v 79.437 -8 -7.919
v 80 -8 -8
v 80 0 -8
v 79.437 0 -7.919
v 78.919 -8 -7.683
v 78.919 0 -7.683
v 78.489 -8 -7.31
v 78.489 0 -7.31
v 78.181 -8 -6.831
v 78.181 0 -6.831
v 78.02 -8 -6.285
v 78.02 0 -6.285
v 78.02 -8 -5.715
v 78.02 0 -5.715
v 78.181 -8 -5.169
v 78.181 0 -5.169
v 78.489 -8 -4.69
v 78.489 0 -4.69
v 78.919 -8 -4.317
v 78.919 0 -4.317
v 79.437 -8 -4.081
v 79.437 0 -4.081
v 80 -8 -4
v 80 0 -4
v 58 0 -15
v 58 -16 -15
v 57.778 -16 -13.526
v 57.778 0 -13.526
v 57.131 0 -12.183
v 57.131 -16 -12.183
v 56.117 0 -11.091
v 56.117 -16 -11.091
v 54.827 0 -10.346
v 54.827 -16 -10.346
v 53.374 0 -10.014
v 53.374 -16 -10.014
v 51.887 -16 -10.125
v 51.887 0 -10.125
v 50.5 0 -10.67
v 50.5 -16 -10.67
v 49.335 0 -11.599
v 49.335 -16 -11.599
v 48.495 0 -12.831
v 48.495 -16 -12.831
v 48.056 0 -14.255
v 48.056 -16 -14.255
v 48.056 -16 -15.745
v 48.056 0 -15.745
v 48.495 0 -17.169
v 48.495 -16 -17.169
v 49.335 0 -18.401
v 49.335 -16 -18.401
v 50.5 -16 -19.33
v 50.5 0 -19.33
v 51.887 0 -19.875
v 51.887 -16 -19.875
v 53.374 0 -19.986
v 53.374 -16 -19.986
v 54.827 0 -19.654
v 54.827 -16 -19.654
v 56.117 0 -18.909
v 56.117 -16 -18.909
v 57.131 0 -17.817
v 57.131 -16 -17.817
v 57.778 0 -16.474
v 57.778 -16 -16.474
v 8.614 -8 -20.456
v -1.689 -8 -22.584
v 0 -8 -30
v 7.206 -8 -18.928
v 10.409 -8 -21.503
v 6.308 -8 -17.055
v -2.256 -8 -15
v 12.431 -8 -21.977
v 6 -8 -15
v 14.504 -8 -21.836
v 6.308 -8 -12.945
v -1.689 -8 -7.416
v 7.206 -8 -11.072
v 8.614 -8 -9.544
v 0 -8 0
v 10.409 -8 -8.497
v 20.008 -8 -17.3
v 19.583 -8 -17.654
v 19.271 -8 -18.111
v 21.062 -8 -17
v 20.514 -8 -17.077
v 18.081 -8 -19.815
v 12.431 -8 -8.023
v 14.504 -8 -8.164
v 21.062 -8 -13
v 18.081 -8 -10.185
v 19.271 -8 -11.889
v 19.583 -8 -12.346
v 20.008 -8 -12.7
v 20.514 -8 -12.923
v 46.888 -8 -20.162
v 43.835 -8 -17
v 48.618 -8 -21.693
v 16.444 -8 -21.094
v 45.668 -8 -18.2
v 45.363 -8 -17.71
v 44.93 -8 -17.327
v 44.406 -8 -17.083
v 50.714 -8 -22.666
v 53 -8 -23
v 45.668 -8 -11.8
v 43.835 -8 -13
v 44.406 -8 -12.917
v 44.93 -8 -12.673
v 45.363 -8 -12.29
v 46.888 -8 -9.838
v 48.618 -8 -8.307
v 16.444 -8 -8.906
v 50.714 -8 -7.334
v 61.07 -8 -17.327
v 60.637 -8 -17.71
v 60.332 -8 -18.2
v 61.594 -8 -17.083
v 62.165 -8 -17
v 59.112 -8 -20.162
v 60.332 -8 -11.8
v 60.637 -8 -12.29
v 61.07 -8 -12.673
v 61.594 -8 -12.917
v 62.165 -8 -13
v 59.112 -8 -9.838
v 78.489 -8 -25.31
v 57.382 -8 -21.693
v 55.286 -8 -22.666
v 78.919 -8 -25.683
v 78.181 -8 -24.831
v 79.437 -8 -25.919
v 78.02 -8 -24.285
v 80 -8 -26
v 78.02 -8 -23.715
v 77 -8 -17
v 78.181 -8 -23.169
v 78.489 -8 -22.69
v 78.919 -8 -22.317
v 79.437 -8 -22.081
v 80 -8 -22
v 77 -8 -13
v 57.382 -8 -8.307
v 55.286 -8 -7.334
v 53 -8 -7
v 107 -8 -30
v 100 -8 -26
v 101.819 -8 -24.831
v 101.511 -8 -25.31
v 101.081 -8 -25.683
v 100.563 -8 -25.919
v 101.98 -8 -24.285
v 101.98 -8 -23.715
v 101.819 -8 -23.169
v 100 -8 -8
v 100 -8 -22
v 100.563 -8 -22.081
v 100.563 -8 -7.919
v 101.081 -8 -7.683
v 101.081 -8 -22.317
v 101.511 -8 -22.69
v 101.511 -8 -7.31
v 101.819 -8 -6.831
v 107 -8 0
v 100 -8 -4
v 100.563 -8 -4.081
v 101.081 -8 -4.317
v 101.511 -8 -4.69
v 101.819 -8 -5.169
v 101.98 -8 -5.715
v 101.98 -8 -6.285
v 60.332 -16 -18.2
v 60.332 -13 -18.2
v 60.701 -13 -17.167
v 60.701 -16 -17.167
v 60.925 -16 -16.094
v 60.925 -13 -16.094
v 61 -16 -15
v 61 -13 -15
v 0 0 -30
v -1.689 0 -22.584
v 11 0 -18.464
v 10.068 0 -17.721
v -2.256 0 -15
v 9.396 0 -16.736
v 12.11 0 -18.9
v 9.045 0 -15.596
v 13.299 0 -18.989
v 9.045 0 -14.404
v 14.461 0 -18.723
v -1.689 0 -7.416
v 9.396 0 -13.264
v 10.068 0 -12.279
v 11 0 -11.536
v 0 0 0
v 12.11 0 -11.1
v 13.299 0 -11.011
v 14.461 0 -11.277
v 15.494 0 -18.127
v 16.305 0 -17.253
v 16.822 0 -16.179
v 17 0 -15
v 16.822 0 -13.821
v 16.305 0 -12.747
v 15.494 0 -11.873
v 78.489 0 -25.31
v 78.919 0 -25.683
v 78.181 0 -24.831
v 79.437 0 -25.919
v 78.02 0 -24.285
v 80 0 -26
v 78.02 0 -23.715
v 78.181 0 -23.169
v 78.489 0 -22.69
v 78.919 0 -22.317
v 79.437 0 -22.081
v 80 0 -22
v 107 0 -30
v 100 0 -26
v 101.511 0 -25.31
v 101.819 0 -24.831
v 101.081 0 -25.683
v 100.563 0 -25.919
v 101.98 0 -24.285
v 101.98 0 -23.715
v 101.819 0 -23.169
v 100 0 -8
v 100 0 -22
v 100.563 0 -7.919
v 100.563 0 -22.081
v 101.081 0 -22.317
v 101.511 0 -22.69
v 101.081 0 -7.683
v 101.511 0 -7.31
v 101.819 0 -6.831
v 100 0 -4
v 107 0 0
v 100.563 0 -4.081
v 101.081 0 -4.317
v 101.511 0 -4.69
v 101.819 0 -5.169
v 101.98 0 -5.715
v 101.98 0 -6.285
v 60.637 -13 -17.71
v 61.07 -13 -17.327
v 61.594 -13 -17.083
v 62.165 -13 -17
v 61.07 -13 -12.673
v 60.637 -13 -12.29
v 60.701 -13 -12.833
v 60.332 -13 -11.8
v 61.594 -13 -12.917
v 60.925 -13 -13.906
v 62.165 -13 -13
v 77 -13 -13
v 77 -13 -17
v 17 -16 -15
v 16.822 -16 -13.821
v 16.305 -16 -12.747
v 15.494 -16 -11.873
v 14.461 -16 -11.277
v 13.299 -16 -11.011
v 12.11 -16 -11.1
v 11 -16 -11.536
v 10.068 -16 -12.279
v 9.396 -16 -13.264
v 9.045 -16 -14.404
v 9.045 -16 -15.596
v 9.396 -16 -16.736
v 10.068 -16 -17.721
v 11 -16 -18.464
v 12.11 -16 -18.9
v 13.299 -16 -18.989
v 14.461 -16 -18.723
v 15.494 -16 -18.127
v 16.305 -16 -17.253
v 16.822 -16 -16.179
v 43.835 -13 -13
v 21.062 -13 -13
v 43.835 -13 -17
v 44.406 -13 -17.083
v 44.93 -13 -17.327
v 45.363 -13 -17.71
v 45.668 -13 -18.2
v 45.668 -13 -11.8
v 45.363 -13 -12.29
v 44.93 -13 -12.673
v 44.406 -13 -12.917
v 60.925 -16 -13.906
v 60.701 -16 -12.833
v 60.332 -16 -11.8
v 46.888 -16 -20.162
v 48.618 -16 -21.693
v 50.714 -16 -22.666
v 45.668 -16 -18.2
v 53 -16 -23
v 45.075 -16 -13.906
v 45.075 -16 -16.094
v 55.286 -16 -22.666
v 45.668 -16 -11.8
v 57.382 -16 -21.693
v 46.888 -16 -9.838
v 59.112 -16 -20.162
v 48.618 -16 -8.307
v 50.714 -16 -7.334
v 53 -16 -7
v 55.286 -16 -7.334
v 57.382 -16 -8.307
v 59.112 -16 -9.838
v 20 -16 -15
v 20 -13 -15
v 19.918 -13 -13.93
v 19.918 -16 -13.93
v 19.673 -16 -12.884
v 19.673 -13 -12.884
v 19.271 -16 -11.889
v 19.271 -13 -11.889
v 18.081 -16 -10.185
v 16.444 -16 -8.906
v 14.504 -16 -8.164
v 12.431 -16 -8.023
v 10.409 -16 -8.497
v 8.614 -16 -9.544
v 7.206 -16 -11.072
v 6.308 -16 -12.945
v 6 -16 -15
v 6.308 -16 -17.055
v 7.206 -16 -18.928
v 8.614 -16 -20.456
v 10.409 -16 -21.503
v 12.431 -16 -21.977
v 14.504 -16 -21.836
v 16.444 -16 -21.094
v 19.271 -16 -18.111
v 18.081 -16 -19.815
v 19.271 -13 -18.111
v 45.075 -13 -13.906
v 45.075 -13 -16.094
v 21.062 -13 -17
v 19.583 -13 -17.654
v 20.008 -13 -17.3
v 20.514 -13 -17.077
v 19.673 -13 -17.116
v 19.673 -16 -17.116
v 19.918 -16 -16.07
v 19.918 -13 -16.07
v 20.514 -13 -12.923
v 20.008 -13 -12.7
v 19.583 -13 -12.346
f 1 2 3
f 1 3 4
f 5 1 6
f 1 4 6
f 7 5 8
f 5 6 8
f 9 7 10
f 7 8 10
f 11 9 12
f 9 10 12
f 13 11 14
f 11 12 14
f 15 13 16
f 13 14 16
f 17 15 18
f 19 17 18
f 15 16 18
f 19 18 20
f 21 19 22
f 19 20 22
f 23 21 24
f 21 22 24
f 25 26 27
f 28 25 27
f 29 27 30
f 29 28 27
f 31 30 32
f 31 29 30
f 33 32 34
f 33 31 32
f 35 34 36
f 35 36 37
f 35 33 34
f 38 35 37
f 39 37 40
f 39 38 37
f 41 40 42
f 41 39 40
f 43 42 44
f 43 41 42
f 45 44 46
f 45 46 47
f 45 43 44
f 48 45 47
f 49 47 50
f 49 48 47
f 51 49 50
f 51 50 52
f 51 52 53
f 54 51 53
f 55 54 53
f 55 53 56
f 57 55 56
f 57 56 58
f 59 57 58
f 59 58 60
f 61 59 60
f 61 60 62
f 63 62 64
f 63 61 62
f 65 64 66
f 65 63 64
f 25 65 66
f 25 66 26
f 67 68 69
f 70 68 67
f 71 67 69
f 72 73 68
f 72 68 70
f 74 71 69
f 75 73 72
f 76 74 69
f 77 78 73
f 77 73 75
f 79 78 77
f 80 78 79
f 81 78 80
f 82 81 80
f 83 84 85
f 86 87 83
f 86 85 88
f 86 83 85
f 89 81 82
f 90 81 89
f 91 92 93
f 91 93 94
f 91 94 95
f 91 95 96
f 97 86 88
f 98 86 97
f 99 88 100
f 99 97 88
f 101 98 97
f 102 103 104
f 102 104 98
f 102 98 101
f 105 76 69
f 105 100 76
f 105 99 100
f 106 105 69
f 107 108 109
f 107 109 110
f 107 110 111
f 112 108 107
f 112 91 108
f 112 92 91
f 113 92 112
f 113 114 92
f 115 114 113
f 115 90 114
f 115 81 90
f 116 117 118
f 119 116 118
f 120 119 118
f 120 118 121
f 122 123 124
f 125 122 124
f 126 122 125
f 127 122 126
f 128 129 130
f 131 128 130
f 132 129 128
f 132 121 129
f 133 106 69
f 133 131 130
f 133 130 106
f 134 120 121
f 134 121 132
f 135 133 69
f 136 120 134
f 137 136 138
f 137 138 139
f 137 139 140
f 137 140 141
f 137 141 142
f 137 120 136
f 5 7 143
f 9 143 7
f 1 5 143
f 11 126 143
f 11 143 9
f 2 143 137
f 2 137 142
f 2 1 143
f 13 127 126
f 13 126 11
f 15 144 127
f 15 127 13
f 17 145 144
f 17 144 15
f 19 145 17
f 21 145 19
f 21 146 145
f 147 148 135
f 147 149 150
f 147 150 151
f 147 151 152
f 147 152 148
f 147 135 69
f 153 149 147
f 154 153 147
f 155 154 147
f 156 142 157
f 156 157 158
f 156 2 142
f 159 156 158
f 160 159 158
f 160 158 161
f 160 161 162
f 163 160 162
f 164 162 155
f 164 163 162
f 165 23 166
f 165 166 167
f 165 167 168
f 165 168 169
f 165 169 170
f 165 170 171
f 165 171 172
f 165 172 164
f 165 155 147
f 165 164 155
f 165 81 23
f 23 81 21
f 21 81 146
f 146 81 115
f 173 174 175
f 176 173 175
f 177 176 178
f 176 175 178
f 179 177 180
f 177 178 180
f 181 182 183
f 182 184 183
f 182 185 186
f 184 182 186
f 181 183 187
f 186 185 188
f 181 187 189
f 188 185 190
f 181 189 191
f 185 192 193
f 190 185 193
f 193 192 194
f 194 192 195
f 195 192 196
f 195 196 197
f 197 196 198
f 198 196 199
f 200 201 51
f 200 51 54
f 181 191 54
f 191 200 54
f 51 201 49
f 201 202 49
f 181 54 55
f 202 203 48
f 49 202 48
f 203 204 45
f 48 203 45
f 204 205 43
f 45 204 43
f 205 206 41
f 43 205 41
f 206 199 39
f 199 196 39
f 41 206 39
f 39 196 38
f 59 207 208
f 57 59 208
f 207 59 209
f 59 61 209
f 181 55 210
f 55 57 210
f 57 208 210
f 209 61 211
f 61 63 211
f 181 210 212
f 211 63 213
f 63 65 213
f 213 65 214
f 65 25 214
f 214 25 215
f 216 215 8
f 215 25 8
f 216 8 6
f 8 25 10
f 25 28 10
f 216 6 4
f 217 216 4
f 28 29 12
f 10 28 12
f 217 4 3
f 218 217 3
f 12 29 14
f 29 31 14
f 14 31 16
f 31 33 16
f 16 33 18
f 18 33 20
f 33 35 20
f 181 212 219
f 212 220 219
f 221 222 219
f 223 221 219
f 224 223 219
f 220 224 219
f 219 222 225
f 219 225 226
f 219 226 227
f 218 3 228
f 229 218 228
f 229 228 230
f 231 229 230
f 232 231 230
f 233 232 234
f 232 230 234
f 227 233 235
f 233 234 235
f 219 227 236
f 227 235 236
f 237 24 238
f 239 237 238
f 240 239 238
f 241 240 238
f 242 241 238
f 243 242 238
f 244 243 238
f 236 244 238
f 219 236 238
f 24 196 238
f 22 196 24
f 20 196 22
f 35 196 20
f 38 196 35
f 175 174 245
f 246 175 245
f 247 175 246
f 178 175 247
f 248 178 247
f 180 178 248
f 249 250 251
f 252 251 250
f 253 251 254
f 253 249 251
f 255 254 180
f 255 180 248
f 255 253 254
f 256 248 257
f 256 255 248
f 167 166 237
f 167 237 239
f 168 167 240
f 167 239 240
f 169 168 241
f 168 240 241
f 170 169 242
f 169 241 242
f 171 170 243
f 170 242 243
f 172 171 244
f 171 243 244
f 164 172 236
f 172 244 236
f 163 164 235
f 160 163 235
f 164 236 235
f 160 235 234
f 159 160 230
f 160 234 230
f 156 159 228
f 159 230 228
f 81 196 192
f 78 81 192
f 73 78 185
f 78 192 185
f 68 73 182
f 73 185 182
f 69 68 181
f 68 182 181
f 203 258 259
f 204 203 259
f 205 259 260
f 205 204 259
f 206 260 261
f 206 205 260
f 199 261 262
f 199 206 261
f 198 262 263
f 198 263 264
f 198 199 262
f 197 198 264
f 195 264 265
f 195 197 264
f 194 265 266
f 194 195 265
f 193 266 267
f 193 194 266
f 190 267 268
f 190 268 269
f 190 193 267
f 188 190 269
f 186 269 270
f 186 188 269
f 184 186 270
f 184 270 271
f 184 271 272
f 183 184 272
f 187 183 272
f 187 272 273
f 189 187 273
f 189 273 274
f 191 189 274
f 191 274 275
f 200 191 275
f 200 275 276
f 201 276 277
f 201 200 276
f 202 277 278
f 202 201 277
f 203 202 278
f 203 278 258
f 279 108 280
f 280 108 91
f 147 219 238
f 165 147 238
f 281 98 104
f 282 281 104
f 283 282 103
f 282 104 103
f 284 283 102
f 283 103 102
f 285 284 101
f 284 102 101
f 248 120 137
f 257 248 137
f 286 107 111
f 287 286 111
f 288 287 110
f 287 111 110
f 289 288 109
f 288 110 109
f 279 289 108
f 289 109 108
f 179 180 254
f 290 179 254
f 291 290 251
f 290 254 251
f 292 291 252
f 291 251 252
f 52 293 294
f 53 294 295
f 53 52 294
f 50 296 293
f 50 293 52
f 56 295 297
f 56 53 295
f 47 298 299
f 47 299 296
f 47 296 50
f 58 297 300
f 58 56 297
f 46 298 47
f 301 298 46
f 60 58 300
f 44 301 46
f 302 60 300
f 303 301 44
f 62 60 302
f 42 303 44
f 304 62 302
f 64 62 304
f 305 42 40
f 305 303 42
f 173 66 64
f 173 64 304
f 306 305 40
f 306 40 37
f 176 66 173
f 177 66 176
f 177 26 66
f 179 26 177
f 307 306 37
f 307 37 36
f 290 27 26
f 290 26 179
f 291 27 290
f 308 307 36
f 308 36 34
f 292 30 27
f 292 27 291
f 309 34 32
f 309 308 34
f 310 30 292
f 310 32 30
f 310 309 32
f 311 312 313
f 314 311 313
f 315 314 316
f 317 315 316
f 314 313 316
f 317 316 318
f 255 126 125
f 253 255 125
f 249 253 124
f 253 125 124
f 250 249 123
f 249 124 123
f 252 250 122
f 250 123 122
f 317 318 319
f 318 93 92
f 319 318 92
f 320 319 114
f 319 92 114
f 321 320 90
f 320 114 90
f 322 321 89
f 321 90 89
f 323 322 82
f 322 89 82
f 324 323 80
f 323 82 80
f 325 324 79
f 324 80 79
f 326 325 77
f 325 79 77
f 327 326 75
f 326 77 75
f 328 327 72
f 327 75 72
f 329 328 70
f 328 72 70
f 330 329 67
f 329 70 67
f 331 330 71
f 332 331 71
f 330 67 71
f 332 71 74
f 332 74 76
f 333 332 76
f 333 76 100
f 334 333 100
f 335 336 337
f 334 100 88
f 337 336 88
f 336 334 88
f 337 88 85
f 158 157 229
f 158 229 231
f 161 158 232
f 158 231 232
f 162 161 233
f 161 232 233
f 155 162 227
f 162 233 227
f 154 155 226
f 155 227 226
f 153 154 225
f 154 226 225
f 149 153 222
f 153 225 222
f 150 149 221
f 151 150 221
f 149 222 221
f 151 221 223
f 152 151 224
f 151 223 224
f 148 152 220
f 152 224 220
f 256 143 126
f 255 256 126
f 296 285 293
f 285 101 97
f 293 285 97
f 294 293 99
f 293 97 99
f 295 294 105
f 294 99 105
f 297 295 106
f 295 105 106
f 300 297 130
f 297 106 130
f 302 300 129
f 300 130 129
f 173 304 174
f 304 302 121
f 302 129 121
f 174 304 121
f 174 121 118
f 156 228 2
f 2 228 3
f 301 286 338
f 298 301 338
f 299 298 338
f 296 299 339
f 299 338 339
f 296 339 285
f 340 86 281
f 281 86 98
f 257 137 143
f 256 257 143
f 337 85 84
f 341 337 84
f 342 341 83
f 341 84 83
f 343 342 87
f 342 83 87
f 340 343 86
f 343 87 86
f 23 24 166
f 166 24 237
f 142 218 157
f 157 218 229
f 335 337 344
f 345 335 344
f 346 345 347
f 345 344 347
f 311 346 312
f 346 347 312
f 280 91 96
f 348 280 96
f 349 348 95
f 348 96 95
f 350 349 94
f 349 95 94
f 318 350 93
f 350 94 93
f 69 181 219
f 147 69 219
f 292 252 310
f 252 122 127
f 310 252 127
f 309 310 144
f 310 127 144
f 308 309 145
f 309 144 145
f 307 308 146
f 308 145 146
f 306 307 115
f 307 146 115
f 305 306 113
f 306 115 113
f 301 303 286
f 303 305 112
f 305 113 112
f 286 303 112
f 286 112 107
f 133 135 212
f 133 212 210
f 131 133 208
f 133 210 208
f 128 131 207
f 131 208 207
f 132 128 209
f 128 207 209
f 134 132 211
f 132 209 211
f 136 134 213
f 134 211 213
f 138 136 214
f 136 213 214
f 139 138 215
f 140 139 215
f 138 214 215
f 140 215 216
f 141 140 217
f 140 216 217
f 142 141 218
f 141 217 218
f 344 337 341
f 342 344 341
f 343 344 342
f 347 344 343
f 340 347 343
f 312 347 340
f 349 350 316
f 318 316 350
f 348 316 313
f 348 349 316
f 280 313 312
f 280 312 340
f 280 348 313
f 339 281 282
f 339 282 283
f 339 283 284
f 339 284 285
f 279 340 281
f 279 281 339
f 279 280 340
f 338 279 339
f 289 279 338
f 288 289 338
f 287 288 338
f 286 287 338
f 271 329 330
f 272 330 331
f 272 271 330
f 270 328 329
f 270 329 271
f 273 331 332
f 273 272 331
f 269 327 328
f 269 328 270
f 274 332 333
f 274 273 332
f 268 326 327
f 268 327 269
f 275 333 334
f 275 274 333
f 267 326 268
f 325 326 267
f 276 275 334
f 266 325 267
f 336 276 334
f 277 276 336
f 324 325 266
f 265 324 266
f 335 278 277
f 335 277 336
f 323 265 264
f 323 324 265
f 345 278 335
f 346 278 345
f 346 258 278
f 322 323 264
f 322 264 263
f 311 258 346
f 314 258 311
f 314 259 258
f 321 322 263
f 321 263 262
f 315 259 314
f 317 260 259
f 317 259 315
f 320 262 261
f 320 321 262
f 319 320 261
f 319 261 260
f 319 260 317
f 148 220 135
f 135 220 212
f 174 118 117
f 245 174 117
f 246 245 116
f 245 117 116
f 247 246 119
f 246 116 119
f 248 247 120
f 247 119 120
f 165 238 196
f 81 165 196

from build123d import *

# Parameters (mm, degrees)
F1_DEPTH = 8
F2_DEPTH = 13
F0_R     = 4
F0_R_2   = 5
F3_DEPTH = 16


with BuildPart() as f1:
    # F0 (on Front) → F1 (new body)
    with BuildSketch(Plane.XZ):
        with BuildLine():
            Line((107, 0), (0, 0))
            ThreePointArc((0, 0), (-2.25577, -15), (0, -30))
            Line((0, -30), (107, -30))
            Line((107, -30), (107, 0))
        make_face()
        with BuildLine():
            ThreePointArc((80, -26), (78, -24), (80, -22))
            Line((80, -22), (100, -22))
            ThreePointArc((100, -22), (102, -24), (100, -26))
            Line((100, -26), (80, -26))
        make_face(mode=Mode.SUBTRACT)
        with BuildLine():
            ThreePointArc((19.270645, -18.111111), (6, -15), (19.270645, -11.888889))
            ThreePointArc((19.270645, -11.888889), (20.008165, -12.699673), (21.062258, -13))
            Line((21.062258, -13), (43.834849, -13))
            ThreePointArc((43.834849, -13), (44.930294, -12.67332), (45.667879, -11.8))
            ThreePointArc((45.667879, -11.8), (53, -7), (60.332121, -11.8))
            ThreePointArc((60.332121, -11.8), (61.069706, -12.67332), (62.165151, -13))
            Line((62.165151, -13), (77, -13))
            Line((77, -13), (77, -17))
            Line((77, -17), (62.165151, -17))
            ThreePointArc((62.165151, -17), (61.069706, -17.32668), (60.332121, -18.2))
            ThreePointArc((60.332121, -18.2), (53, -23), (45.667879, -18.2))
            ThreePointArc((45.667879, -18.2), (44.930294, -17.32668), (43.834849, -17))
            Line((43.834849, -17), (21.062258, -17))
            ThreePointArc((21.062258, -17), (20.008165, -17.300327), (19.270645, -18.111111))
        make_face(mode=Mode.SUBTRACT)
        with BuildLine():
            ThreePointArc((80, -8), (78, -6), (80, -4))
            Line((80, -4), (100, -4))
            ThreePointArc((100, -4), (102, -6), (100, -8))
            Line((100, -8), (80, -8))
        make_face(mode=Mode.SUBTRACT)
    extrude(amount=F1_DEPTH)

    # F0 (on Front) → F2 (join)
    with BuildSketch(Plane.XZ):
        with BuildLine():
            ThreePointArc((19.270645, -11.888889), (19.815222, -13.402269), (20, -15))
            ThreePointArc((20, -15), (19.815222, -16.597731), (19.270645, -18.111111))
            ThreePointArc((19.270645, -18.111111), (20.008165, -17.300327), (21.062258, -17))
            Line((21.062258, -17), (43.834849, -17))
            ThreePointArc((43.834849, -17), (44.930294, -17.32668), (45.667879, -18.2))
            ThreePointArc((45.667879, -18.2), (45, -15), (45.667879, -11.8))
            ThreePointArc((45.667879, -11.8), (44.930294, -12.67332), (43.834849, -13))
            Line((43.834849, -13), (21.062258, -13))
            ThreePointArc((21.062258, -13), (20.008165, -12.699673), (19.270645, -11.888889))
        make_face()
        with BuildLine():
            ThreePointArc((62.165151, -13), (61.069706, -12.67332), (60.332121, -11.8))
            ThreePointArc((60.332121, -11.8), (60.831251, -13.365523), (61, -15))
            ThreePointArc((61, -15), (60.831251, -16.634477), (60.332121, -18.2))
            ThreePointArc((60.332121, -18.2), (61.069706, -17.32668), (62.165151, -17))
            Line((62.165151, -17), (77, -17))
            Line((77, -17), (77, -13))
            Line((77, -13), (62.165151, -13))
        make_face()
    extrude(amount=F2_DEPTH)

    # F0 (on Front) → F3 (join)
    with BuildSketch(Plane.XZ):
        with BuildLine():
            ThreePointArc((19.270645, -18.111111), (19.815222, -16.597731), (20, -15))
            ThreePointArc((20, -15), (19.815222, -13.402269), (19.270645, -11.888889))
            ThreePointArc((19.270645, -11.888889), (6, -15), (19.270645, -18.111111))
        make_face()
        with Locations((13, -15)):
            Circle(F0_R, mode=Mode.SUBTRACT)
        with BuildLine():
            ThreePointArc((60.332121, -11.8), (53, -7), (45.667879, -11.8))
            ThreePointArc((45.667879, -11.8), (45, -15), (45.667879, -18.2))
            ThreePointArc((45.667879, -18.2), (53, -23), (60.332121, -18.2))
            ThreePointArc((60.332121, -18.2), (60.831251, -16.634477), (61, -15))
            ThreePointArc((61, -15), (60.831251, -13.365523), (60.332121, -11.8))
        make_face()
        with Locations((53, -15)):
            Circle(F0_R_2, mode=Mode.SUBTRACT)
    extrude(amount=F3_DEPTH)


solid = f1.part
